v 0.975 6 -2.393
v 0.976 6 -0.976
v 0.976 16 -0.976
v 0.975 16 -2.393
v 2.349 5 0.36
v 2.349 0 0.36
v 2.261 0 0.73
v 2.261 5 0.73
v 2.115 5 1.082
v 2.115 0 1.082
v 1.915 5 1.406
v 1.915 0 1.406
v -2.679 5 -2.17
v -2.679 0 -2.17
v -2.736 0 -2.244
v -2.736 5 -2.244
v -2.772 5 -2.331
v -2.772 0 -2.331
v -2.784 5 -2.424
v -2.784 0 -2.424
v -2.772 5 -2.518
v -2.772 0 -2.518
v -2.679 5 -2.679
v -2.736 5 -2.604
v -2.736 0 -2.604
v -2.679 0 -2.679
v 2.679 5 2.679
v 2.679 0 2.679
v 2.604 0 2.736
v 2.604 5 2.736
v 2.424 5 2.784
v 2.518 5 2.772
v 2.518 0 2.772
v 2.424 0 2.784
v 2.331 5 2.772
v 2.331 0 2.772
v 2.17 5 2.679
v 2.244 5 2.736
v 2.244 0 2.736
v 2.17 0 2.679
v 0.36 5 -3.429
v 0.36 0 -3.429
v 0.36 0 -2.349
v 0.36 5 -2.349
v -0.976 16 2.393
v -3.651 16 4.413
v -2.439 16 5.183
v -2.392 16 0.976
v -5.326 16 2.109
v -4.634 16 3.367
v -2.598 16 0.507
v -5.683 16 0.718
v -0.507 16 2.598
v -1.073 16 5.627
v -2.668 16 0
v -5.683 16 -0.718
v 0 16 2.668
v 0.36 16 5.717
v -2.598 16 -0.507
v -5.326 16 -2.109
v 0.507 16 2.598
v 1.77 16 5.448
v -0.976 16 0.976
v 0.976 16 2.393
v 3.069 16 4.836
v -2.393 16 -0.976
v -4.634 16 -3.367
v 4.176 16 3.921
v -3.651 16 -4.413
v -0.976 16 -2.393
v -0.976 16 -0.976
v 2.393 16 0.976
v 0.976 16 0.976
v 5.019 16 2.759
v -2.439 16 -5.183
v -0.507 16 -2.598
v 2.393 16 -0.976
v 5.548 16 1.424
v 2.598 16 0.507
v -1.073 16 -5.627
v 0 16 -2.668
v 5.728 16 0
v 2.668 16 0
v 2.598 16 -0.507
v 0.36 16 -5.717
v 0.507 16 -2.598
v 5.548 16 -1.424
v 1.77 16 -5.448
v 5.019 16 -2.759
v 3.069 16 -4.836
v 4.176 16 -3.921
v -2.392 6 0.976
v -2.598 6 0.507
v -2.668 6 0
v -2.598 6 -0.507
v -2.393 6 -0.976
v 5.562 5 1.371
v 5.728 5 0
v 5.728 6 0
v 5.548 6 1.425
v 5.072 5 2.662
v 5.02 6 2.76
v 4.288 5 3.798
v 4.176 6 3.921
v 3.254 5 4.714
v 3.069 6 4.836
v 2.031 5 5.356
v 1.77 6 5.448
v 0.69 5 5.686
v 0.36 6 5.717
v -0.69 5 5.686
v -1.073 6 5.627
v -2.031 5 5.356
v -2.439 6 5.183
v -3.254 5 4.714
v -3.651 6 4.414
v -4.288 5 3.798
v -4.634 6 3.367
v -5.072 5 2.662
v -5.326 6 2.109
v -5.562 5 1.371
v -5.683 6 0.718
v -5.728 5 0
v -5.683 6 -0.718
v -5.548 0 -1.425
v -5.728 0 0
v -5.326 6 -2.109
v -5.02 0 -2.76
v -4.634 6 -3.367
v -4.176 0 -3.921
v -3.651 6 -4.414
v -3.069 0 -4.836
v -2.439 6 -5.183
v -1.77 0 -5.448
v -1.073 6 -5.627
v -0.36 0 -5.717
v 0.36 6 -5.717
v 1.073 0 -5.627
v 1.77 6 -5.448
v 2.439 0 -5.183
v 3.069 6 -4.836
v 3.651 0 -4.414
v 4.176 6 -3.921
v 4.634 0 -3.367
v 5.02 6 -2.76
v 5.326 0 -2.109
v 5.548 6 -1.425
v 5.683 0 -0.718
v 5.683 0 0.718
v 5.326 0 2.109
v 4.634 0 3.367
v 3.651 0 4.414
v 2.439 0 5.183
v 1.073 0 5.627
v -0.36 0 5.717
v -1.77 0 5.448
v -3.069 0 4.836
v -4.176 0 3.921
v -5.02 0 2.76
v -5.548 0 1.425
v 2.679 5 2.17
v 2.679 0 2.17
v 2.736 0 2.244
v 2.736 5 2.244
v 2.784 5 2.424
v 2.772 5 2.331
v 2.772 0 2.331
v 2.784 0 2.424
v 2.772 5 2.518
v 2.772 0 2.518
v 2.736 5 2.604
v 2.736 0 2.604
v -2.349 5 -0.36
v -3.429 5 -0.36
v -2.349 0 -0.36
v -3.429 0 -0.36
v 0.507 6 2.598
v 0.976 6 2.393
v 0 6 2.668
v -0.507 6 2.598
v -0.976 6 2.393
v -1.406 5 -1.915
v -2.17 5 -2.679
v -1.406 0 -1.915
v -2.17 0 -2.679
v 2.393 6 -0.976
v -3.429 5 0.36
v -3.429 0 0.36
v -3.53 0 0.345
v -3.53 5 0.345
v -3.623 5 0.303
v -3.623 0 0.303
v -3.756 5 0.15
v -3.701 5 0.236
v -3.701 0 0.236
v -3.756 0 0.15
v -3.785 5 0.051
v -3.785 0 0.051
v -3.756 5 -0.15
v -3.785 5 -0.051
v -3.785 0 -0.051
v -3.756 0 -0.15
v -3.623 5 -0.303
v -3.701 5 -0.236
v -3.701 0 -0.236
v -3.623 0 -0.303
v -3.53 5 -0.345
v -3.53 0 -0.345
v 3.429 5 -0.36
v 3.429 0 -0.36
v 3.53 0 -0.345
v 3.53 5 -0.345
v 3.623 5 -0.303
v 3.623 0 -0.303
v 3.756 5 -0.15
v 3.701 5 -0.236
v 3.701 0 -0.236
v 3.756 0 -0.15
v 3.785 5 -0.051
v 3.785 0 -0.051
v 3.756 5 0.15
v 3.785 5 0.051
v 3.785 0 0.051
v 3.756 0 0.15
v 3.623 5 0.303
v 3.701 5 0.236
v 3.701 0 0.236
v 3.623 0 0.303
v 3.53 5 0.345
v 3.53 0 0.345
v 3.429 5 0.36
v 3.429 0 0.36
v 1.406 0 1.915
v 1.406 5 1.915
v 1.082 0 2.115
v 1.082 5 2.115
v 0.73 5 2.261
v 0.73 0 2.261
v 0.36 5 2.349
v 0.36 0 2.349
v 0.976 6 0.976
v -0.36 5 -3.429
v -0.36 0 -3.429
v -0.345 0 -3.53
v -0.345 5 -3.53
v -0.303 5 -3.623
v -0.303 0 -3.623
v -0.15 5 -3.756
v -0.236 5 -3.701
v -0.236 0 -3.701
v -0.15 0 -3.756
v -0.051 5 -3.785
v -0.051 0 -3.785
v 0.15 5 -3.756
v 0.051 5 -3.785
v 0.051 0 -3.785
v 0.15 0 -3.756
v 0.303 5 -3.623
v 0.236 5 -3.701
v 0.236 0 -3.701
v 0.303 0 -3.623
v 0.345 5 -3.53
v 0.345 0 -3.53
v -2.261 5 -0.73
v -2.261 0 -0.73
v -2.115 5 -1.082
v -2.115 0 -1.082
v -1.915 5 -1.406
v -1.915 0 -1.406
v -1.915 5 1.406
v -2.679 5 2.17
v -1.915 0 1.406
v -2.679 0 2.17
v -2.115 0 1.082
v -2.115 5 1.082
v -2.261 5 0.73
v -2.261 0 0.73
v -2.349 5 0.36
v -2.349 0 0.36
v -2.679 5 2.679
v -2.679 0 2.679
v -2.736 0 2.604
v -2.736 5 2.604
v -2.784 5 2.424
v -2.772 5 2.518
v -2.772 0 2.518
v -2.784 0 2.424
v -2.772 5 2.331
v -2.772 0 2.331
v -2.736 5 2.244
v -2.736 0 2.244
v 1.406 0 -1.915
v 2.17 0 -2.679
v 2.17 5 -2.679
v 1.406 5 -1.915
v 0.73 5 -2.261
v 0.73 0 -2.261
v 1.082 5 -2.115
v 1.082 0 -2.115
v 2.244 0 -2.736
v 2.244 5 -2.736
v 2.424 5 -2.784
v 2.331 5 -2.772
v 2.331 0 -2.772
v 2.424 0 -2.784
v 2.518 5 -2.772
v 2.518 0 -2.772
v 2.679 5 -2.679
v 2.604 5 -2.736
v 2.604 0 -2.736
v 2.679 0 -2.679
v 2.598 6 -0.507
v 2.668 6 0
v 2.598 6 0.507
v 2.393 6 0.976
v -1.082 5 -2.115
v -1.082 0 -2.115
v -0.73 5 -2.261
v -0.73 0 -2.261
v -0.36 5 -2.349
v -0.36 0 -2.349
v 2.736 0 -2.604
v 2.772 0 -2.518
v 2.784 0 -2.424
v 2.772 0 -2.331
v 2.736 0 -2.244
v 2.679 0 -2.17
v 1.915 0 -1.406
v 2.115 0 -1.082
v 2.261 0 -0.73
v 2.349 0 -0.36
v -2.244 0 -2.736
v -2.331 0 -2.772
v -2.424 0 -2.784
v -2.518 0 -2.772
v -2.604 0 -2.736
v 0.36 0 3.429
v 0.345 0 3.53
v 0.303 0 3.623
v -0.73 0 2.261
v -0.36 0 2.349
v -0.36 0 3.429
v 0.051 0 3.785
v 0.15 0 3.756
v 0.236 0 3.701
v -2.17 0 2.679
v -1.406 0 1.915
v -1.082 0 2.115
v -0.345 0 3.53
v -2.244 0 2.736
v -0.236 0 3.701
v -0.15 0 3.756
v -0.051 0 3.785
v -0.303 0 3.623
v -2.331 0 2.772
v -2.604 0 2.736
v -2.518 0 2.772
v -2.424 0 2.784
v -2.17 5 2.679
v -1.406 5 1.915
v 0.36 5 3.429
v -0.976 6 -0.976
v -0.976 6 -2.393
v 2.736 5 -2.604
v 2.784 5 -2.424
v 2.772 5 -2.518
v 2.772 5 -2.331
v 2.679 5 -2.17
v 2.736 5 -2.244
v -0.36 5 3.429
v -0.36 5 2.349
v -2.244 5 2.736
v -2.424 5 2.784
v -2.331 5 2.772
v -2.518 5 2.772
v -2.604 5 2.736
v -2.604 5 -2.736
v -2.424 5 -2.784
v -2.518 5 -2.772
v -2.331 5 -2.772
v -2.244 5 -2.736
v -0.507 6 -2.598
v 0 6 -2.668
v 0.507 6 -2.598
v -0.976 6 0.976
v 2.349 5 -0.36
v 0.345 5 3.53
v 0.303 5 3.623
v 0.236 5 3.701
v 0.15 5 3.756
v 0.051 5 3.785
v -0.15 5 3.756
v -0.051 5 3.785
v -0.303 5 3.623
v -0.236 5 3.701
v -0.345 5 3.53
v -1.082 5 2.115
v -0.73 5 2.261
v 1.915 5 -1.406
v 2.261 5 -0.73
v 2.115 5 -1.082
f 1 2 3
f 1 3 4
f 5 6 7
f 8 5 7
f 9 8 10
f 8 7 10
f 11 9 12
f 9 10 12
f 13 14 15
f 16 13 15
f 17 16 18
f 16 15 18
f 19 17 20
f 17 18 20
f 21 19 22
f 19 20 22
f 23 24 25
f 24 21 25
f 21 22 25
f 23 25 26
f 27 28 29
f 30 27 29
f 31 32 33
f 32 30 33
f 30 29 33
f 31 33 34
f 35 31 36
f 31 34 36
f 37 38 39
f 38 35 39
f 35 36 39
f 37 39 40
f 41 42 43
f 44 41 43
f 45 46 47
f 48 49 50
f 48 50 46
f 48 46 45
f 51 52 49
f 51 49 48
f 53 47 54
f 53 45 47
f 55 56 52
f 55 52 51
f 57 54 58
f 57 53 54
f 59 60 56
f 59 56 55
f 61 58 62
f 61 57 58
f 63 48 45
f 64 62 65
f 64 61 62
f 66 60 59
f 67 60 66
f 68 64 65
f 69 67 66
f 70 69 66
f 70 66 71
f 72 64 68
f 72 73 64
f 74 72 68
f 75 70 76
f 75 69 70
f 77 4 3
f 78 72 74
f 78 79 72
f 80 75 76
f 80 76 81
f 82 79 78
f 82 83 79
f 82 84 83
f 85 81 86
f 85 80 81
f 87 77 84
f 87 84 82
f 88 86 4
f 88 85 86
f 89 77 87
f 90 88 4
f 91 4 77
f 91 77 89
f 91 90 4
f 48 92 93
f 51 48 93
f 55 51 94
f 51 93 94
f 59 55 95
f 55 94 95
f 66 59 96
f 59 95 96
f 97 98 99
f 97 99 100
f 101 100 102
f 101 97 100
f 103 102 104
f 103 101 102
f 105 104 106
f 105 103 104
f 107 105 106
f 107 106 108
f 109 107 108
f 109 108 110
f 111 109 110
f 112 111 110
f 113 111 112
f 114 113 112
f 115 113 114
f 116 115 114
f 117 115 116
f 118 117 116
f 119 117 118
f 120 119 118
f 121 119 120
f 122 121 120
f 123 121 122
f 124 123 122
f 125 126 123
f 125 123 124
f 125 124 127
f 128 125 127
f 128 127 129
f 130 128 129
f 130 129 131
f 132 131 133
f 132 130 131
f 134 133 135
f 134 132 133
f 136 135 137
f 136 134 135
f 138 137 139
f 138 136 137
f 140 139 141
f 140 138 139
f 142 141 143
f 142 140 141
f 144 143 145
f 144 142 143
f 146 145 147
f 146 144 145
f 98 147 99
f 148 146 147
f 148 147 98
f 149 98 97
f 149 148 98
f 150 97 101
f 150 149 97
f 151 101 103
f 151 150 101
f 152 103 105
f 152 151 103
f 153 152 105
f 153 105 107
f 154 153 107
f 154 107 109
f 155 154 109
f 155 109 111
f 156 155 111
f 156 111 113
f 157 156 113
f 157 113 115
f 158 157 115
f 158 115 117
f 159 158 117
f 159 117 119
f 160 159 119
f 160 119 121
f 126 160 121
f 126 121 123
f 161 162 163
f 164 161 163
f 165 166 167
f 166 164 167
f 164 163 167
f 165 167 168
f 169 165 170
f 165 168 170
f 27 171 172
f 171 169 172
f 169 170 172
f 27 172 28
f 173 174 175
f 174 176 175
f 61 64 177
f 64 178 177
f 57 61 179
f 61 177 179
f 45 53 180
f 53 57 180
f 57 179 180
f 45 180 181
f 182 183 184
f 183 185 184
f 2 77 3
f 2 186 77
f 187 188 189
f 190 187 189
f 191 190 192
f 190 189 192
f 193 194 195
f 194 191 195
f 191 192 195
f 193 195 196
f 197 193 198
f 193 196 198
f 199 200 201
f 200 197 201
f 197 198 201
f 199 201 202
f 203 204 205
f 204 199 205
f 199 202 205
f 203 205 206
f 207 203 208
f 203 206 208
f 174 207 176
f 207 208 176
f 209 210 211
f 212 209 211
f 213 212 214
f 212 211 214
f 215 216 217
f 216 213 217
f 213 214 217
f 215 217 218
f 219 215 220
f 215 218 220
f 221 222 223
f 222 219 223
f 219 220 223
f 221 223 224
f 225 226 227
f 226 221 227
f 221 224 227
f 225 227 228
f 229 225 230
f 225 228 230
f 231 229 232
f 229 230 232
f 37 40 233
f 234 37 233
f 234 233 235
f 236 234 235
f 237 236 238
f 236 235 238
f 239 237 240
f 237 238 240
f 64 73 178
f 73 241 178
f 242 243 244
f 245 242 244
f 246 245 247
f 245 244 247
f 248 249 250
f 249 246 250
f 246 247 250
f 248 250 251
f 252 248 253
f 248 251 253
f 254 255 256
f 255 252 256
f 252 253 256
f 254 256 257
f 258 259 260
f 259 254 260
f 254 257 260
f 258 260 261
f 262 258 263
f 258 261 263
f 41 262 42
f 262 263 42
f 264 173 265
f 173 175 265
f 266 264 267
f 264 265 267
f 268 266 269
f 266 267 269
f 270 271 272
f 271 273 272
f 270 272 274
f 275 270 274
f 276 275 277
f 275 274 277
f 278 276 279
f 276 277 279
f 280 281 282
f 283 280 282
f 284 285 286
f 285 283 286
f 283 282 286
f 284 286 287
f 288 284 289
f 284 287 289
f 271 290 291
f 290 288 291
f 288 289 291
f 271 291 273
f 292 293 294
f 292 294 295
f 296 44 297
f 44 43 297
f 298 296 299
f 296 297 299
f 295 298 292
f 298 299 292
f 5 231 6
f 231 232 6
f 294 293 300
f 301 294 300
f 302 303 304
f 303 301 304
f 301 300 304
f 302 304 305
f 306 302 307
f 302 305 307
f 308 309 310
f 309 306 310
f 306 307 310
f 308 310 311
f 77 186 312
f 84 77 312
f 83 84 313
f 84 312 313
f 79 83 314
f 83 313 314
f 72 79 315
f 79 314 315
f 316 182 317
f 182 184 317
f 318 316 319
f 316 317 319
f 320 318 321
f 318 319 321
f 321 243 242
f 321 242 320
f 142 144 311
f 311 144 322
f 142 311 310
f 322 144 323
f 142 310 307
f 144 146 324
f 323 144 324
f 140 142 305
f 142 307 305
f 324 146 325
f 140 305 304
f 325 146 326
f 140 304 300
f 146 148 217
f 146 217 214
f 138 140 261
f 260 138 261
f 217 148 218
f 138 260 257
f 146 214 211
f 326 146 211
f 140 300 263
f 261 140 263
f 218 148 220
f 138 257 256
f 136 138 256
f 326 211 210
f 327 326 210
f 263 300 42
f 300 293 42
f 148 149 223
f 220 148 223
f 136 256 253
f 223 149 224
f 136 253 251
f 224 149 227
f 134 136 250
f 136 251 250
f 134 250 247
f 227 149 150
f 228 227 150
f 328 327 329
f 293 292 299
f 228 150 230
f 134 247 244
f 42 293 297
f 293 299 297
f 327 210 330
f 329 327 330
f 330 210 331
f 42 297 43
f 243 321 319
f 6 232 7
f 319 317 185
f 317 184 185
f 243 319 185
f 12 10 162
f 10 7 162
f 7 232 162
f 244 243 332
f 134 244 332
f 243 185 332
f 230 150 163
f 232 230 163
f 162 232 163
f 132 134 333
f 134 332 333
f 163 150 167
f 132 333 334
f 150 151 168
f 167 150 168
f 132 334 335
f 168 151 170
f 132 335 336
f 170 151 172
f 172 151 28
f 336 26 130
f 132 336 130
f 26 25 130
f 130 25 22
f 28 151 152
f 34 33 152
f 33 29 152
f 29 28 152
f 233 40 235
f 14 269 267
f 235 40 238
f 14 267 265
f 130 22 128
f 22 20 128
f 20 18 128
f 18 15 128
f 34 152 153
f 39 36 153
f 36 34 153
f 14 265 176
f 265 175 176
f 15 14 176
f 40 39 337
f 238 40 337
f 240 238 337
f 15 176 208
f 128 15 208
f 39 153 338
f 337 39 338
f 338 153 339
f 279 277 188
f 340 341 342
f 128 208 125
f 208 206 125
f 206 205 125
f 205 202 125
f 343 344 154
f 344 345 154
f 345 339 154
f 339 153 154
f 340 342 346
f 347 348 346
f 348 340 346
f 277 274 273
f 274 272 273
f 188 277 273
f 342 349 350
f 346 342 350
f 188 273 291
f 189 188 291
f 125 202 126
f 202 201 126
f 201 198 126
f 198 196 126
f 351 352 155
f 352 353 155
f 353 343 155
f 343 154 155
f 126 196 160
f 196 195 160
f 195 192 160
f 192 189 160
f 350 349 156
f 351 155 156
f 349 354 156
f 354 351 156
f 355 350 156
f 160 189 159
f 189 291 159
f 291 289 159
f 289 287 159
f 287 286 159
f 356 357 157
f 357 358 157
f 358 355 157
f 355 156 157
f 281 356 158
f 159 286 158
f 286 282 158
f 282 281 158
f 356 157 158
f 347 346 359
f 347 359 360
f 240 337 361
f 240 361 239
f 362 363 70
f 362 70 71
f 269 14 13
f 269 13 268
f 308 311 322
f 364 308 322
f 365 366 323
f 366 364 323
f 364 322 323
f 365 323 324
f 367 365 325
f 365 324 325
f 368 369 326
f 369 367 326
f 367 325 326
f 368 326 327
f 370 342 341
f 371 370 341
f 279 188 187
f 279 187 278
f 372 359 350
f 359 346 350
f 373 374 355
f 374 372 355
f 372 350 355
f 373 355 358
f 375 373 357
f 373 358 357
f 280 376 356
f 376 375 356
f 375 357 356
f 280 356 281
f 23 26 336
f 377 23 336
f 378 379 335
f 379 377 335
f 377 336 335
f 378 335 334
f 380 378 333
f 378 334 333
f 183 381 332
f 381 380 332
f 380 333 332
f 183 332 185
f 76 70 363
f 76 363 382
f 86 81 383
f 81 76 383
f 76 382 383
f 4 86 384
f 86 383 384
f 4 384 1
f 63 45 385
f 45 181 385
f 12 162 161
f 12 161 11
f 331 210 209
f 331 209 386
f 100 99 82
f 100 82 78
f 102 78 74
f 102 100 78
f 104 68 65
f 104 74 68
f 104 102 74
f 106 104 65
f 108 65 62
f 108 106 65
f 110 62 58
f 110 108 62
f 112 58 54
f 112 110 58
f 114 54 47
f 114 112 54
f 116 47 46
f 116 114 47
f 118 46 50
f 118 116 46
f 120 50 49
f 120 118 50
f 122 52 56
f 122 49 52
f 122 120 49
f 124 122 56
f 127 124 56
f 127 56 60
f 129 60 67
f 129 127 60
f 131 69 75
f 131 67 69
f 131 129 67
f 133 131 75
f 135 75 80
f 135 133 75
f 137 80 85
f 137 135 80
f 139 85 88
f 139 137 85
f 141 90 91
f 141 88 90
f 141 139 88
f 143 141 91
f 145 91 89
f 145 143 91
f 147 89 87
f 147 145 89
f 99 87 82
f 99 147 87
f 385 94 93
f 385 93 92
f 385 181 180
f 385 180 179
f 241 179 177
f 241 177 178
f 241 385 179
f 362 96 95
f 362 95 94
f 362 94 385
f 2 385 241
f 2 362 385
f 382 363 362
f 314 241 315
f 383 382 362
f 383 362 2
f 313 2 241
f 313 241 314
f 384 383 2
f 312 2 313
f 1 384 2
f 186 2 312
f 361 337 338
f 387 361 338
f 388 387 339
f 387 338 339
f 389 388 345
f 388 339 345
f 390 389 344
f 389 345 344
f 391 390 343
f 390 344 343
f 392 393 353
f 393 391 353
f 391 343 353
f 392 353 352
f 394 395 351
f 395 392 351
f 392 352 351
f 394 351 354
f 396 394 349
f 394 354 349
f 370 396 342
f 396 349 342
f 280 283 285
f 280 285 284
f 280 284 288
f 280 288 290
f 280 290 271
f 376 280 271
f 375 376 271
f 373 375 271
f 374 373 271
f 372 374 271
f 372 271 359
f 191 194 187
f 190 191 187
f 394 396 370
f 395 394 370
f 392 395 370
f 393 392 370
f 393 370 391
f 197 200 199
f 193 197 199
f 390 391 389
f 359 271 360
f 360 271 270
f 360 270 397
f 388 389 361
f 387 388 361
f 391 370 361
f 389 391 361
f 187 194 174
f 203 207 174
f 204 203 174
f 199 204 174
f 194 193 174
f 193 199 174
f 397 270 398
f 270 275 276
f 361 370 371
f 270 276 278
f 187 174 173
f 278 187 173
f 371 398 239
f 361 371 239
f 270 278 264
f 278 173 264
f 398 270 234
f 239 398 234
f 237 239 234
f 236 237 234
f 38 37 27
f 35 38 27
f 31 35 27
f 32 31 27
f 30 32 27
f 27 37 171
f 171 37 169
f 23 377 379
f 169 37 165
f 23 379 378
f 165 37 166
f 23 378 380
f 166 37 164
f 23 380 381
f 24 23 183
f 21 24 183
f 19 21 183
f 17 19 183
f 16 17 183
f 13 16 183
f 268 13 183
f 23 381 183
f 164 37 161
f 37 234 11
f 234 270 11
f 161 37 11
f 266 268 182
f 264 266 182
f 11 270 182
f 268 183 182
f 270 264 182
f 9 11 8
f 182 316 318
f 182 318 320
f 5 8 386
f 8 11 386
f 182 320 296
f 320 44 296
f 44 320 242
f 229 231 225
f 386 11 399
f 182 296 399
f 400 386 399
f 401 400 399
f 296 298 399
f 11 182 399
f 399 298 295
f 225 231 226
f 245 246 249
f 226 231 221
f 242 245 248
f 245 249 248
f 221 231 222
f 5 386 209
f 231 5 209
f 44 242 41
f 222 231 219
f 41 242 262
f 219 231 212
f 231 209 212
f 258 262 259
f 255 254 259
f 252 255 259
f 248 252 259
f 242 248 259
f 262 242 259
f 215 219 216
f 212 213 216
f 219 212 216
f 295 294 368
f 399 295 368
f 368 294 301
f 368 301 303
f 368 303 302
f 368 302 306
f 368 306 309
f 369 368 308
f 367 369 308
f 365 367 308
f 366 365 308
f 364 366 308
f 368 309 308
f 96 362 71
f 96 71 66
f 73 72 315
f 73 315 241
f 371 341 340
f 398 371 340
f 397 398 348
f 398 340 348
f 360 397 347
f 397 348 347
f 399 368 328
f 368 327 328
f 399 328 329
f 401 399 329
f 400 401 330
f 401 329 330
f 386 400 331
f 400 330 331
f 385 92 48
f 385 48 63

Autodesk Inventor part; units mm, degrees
ref_plane "YZ Plane" through (0, 0, 0) normal (1, 0, 0) x (0, 1, 0)
ref_plane "XZ Plane" through (0, 0, 0) normal (0, 1, 0) x (-1, 0, 0)
ref_plane "XY Plane" through (0, 0, 0) normal (0, 0, 1) x (1, 0, 0)
sketch "Sketch1" plane through (0, 0, 0) normal (0, 1, 0) x (-1, 0, 0)
  arc A0 (0, 3.7886) -> (-0.36, 3.4286) centre (0, 3.4286) ccw
  arc A1 (0.36, 3.4286) -> (0, 3.7886) centre (0, 3.4286) ccw
  line L0 (0, 3.7886) -> (0, 3.7886)
  line L1 (-2.6789, 2.1698) -> (-1.9152, 1.4061)
  arc A2 (-2.1698, 2.6789) -> (-2.6789, 2.6789) centre (-2.4244, 2.4244) ccw
  line L2 (-2.6789, 2.6789) -> (-2.6789, 2.6789)
  arc A3 (-2.6789, 2.6789) -> (-2.6789, 2.1698) centre (-2.4244, 2.4244) ccw
  line L3 (-3.4286, 0.36) -> (-2.3486, 0.36)
  arc A4 (-2.3486, 0.36) -> (-2.3486, -0.36) centre (0, 0) ccw
  line L4 (-3.4286, -0.36) -> (-2.3486, -0.36)
  arc A5 (-3.4286, 0.36) -> (-3.7886, 0) centre (-3.4286, 0) ccw
  line L5 (-3.7886, 0) -> (-3.7886, 0)
  arc A6 (-3.7886, 0) -> (-3.4286, -0.36) centre (-3.4286, 0) ccw
  line L6 (-2.6789, -2.1698) -> (-1.9152, -1.4061)
  arc A7 (-2.6789, -2.1698) -> (-2.6789, -2.6789) centre (-2.4244, -2.4244) ccw
  line L7 (-2.6789, -2.6789) -> (-2.6789, -2.6789)
  arc A8 (-2.6789, -2.6789) -> (-2.1698, -2.6789) centre (-2.4244, -2.4244) ccw
  line L8 (-2.1698, -2.6789) -> (-1.4061, -1.9152)
  arc A9 (-1.9152, -1.4061) -> (-1.4061, -1.9152) centre (0, 0) ccw
  line L9 (-0.36, -3.4286) -> (-0.36, -2.3486)
  arc A10 (-0.36, -2.3486) -> (0.36, -2.3486) centre (0, 0) ccw
  arc A11 (-0.36, -3.4286) -> (0, -3.7886) centre (0, -3.4286) ccw
  line L10 (0, -3.7886) -> (0, -3.7886)
  arc A12 (0, -3.7886) -> (0.36, -3.4286) centre (0, -3.4286) ccw
  line L11 (0.36, -3.4286) -> (0.36, -2.3486)
  line L12 (2.1698, -2.6789) -> (1.4061, -1.9152)
  arc A13 (1.4061, -1.9152) -> (1.9152, -1.4061) centre (0, 0) ccw
  arc A14 (2.1698, -2.6789) -> (2.6789, -2.6789) centre (2.4244, -2.4244) ccw
  line L13 (2.6789, -2.6789) -> (2.6789, -2.6789)
  arc A15 (2.6789, -2.6789) -> (2.6789, -2.1698) centre (2.4244, -2.4244) ccw
  line L14 (2.6789, -2.1698) -> (1.9152, -1.4061)
  line L15 (3.4286, -0.36) -> (2.3486, -0.36)
  arc A16 (2.3486, -0.36) -> (2.3486, 0.36) centre (0, 0) ccw
  line L16 (3.4286, 0.36) -> (2.3486, 0.36)
  arc A17 (3.4286, -0.36) -> (3.7886, 0) centre (3.4286, 0) ccw
  line L17 (3.7886, 0) -> (3.7886, 0)
  arc A18 (3.7886, 0) -> (3.4286, 0.36) centre (3.4286, 0) ccw
  line L18 (2.6789, 2.1698) -> (1.9152, 1.4061)
  arc A19 (1.9152, 1.4061) -> (1.4061, 1.9152) centre (0, 0) ccw
  arc A20 (2.6789, 2.1698) -> (2.6789, 2.6789) centre (2.4244, 2.4244) ccw
  line L19 (2.6789, 2.6789) -> (2.6789, 2.6789)
  arc A21 (2.6789, 2.6789) -> (2.1698, 2.6789) centre (2.4244, 2.4244) ccw
  line L20 (2.1698, 2.6789) -> (1.4061, 1.9152)
  line L21 (0.36, 3.4286) -> (0.36, 2.3486)
  arc A22 (0.36, 2.3486) -> (-0.36, 2.3486) centre (0, 0) ccw
  line L22 (-2.1698, 2.6789) -> (-1.4061, 1.9152)
  arc A23 (-1.4061, 1.9152) -> (-1.9152, 1.4061) centre (0, 0) ccw
  circle A24 centre (0, 0) radius 2.376
  line L23 (-0.36, 3.4286) -> (-0.36, 2.3486)
  circle A25 centre (0, 0) radius 5.7281
  point P0 (-0.36, 3.7886)
  point P1 (0.36, 3.7886)
  point P2 (-2.0323, 2.0323)
  point P3 (-2.9335, 2.4244)
  point P4 (-2.4244, 2.9335)
  point P5 (-3.7886, 0.36)
  point P6 (-2.8742, 0)
  point P7 (-3.7886, -0.36)
  point P8 (-2.9335, -2.4244)
  point P9 (-2.0323, -2.0323)
  point P10 (-2.4244, -2.9335)
  point P11 (-0.36, -3.7886)
  point P12 (0, -2.8742)
  point P13 (0.36, -3.7886)
  point P14 (2.4244, -2.9335)
  point P15 (2.0323, -2.0323)
  point P16 (2.9335, -2.4244)
  point P17 (3.7886, -0.36)
  point P18 (2.8742, 0)
  point P19 (3.7886, 0.36)
  point P20 (2.9335, 2.4244)
  point P21 (2.4244, 2.9335)
  point P22 (2.0323, 2.0323)
  point P23 (0, 2.8742)
  point P24 (-1.4061, 1.9152)
  point P25 (0, 3.7886)
  point P26 (1.4061, 1.9152)
  point P27 (1.9152, 1.4061)
  point P28 (2.3486, 0.36)
  point P29 (3.7886, 0)
  point P30 (2.3486, -0.36)
  point P31 (2.6789, -2.6789)
  point P32 (1.4061, -1.9152)
  point P33 (0.36, -2.3486)
  point P34 (0, -3.7886)
  point P35 (-0.36, -2.3486)
  point P36 (-1.4061, -1.9152)
  point P37 (-2.6789, -2.6789)
  point P38 (-1.9152, -1.4061)
  point P39 (-2.3486, -0.36)
  point P40 (-3.7886, 0)
  point P41 (-1.9152, 1.4061)
  dimension "d2" = 4.752
  dimension "d3" = 0.72
  dimension "d4" = 1.44
  dimension "d5" = 1.44
  dimension "d6" = 0.36
  dimension "d7" = 360
  dimension "d38" = 0
  dimension "d39" = 0
extrude "Extrusion1" add sketch "Sketch1" along normal blind 5
sketch "Sketch2" plane through (0, 5, 0) normal (0, 1, 0) x (1, 0, 0)
  circle A0 centre (0, 0) radius 5.7281
  point P0 (0, 0)
extrude "Extrusion2" add sketch "Sketch2" along normal blind 1
sketch "Sketch7" plane through (0, 6, 0) normal (0, 1, 0) x (1, 0, 0)
  line L0 (2.3926, -0.9756) -> (2.3926, 0.9756)
  line L1 (2.3926, 0.9756) -> (0.9755, 0.9755)
  line L2 (0.9755, 0.9755) -> (0.9754, 2.3926)
  line L3 (0.9754, 2.3926) -> (-0.9756, 2.3926)
  arc A0 (0.9754, 2.3926) -> (-0.9756, 2.3926) centre (0, 0.8054) ccw
  arc A1 (2.3926, -0.9756) -> (2.3926, 0.9756) centre (0.8054, 0) ccw
  line L4 (2.3926, -0.9756) -> (0.9755, -0.9756)
  line L5 (0.9755, -0.9756) -> (0.9756, -2.3926)
  line L6 (0.9756, -2.3926) -> (-0.9755, -2.3926)
  arc A2 (-0.9755, -2.3926) -> (0.9756, -2.3926) centre (0, -0.8054) ccw
  line L7 (-0.9756, 2.3926) -> (-0.9756, 0.9756)
  line L8 (-0.9755, -2.3926) -> (-0.9756, -0.9755)
  line L9 (-0.9756, 0.9756) -> (-2.3926, 0.9756)
  line L10 (-2.3926, 0.9756) -> (-2.3925, -0.9755)
  line L11 (-2.3925, -0.9755) -> (-0.9756, -0.9755)
  arc A3 (-2.3926, 0.9756) -> (-2.3925, -0.9755) centre (-0.8054, 0) ccw
  circle A4 centre (0, 0) radius 5.728
  dimension "d29" = 1.951
  dimension "d32" = 1.9511
  dimension "d34" = 0.9756
  dimension "d31" = 1.4171
  dimension "d30" = 1.417
  dimension "d33" = 2.5838
  dimension "d28" = 1.863
  dimension "d27" = 1.863
  dimension "d25" = 1.417
  dimension "d24" = 1.9511
  dimension "d23" = 1.863
  dimension "d26" = 1.417
  dimension "d21" = 2.5838
  dimension "d20" = 1.9511
  dimension "d19" = 1.863
  dimension "d18" = 2.3925
  dimension "d17" = 2.3925
  dimension "d22" = 1.417
  dimension "d16" = 1.417
  dimension "d15" = 11.456
extrude "Extrusion4" add sketch "Sketch7" along normal blind 10
properties part number "Servo_stycke"
